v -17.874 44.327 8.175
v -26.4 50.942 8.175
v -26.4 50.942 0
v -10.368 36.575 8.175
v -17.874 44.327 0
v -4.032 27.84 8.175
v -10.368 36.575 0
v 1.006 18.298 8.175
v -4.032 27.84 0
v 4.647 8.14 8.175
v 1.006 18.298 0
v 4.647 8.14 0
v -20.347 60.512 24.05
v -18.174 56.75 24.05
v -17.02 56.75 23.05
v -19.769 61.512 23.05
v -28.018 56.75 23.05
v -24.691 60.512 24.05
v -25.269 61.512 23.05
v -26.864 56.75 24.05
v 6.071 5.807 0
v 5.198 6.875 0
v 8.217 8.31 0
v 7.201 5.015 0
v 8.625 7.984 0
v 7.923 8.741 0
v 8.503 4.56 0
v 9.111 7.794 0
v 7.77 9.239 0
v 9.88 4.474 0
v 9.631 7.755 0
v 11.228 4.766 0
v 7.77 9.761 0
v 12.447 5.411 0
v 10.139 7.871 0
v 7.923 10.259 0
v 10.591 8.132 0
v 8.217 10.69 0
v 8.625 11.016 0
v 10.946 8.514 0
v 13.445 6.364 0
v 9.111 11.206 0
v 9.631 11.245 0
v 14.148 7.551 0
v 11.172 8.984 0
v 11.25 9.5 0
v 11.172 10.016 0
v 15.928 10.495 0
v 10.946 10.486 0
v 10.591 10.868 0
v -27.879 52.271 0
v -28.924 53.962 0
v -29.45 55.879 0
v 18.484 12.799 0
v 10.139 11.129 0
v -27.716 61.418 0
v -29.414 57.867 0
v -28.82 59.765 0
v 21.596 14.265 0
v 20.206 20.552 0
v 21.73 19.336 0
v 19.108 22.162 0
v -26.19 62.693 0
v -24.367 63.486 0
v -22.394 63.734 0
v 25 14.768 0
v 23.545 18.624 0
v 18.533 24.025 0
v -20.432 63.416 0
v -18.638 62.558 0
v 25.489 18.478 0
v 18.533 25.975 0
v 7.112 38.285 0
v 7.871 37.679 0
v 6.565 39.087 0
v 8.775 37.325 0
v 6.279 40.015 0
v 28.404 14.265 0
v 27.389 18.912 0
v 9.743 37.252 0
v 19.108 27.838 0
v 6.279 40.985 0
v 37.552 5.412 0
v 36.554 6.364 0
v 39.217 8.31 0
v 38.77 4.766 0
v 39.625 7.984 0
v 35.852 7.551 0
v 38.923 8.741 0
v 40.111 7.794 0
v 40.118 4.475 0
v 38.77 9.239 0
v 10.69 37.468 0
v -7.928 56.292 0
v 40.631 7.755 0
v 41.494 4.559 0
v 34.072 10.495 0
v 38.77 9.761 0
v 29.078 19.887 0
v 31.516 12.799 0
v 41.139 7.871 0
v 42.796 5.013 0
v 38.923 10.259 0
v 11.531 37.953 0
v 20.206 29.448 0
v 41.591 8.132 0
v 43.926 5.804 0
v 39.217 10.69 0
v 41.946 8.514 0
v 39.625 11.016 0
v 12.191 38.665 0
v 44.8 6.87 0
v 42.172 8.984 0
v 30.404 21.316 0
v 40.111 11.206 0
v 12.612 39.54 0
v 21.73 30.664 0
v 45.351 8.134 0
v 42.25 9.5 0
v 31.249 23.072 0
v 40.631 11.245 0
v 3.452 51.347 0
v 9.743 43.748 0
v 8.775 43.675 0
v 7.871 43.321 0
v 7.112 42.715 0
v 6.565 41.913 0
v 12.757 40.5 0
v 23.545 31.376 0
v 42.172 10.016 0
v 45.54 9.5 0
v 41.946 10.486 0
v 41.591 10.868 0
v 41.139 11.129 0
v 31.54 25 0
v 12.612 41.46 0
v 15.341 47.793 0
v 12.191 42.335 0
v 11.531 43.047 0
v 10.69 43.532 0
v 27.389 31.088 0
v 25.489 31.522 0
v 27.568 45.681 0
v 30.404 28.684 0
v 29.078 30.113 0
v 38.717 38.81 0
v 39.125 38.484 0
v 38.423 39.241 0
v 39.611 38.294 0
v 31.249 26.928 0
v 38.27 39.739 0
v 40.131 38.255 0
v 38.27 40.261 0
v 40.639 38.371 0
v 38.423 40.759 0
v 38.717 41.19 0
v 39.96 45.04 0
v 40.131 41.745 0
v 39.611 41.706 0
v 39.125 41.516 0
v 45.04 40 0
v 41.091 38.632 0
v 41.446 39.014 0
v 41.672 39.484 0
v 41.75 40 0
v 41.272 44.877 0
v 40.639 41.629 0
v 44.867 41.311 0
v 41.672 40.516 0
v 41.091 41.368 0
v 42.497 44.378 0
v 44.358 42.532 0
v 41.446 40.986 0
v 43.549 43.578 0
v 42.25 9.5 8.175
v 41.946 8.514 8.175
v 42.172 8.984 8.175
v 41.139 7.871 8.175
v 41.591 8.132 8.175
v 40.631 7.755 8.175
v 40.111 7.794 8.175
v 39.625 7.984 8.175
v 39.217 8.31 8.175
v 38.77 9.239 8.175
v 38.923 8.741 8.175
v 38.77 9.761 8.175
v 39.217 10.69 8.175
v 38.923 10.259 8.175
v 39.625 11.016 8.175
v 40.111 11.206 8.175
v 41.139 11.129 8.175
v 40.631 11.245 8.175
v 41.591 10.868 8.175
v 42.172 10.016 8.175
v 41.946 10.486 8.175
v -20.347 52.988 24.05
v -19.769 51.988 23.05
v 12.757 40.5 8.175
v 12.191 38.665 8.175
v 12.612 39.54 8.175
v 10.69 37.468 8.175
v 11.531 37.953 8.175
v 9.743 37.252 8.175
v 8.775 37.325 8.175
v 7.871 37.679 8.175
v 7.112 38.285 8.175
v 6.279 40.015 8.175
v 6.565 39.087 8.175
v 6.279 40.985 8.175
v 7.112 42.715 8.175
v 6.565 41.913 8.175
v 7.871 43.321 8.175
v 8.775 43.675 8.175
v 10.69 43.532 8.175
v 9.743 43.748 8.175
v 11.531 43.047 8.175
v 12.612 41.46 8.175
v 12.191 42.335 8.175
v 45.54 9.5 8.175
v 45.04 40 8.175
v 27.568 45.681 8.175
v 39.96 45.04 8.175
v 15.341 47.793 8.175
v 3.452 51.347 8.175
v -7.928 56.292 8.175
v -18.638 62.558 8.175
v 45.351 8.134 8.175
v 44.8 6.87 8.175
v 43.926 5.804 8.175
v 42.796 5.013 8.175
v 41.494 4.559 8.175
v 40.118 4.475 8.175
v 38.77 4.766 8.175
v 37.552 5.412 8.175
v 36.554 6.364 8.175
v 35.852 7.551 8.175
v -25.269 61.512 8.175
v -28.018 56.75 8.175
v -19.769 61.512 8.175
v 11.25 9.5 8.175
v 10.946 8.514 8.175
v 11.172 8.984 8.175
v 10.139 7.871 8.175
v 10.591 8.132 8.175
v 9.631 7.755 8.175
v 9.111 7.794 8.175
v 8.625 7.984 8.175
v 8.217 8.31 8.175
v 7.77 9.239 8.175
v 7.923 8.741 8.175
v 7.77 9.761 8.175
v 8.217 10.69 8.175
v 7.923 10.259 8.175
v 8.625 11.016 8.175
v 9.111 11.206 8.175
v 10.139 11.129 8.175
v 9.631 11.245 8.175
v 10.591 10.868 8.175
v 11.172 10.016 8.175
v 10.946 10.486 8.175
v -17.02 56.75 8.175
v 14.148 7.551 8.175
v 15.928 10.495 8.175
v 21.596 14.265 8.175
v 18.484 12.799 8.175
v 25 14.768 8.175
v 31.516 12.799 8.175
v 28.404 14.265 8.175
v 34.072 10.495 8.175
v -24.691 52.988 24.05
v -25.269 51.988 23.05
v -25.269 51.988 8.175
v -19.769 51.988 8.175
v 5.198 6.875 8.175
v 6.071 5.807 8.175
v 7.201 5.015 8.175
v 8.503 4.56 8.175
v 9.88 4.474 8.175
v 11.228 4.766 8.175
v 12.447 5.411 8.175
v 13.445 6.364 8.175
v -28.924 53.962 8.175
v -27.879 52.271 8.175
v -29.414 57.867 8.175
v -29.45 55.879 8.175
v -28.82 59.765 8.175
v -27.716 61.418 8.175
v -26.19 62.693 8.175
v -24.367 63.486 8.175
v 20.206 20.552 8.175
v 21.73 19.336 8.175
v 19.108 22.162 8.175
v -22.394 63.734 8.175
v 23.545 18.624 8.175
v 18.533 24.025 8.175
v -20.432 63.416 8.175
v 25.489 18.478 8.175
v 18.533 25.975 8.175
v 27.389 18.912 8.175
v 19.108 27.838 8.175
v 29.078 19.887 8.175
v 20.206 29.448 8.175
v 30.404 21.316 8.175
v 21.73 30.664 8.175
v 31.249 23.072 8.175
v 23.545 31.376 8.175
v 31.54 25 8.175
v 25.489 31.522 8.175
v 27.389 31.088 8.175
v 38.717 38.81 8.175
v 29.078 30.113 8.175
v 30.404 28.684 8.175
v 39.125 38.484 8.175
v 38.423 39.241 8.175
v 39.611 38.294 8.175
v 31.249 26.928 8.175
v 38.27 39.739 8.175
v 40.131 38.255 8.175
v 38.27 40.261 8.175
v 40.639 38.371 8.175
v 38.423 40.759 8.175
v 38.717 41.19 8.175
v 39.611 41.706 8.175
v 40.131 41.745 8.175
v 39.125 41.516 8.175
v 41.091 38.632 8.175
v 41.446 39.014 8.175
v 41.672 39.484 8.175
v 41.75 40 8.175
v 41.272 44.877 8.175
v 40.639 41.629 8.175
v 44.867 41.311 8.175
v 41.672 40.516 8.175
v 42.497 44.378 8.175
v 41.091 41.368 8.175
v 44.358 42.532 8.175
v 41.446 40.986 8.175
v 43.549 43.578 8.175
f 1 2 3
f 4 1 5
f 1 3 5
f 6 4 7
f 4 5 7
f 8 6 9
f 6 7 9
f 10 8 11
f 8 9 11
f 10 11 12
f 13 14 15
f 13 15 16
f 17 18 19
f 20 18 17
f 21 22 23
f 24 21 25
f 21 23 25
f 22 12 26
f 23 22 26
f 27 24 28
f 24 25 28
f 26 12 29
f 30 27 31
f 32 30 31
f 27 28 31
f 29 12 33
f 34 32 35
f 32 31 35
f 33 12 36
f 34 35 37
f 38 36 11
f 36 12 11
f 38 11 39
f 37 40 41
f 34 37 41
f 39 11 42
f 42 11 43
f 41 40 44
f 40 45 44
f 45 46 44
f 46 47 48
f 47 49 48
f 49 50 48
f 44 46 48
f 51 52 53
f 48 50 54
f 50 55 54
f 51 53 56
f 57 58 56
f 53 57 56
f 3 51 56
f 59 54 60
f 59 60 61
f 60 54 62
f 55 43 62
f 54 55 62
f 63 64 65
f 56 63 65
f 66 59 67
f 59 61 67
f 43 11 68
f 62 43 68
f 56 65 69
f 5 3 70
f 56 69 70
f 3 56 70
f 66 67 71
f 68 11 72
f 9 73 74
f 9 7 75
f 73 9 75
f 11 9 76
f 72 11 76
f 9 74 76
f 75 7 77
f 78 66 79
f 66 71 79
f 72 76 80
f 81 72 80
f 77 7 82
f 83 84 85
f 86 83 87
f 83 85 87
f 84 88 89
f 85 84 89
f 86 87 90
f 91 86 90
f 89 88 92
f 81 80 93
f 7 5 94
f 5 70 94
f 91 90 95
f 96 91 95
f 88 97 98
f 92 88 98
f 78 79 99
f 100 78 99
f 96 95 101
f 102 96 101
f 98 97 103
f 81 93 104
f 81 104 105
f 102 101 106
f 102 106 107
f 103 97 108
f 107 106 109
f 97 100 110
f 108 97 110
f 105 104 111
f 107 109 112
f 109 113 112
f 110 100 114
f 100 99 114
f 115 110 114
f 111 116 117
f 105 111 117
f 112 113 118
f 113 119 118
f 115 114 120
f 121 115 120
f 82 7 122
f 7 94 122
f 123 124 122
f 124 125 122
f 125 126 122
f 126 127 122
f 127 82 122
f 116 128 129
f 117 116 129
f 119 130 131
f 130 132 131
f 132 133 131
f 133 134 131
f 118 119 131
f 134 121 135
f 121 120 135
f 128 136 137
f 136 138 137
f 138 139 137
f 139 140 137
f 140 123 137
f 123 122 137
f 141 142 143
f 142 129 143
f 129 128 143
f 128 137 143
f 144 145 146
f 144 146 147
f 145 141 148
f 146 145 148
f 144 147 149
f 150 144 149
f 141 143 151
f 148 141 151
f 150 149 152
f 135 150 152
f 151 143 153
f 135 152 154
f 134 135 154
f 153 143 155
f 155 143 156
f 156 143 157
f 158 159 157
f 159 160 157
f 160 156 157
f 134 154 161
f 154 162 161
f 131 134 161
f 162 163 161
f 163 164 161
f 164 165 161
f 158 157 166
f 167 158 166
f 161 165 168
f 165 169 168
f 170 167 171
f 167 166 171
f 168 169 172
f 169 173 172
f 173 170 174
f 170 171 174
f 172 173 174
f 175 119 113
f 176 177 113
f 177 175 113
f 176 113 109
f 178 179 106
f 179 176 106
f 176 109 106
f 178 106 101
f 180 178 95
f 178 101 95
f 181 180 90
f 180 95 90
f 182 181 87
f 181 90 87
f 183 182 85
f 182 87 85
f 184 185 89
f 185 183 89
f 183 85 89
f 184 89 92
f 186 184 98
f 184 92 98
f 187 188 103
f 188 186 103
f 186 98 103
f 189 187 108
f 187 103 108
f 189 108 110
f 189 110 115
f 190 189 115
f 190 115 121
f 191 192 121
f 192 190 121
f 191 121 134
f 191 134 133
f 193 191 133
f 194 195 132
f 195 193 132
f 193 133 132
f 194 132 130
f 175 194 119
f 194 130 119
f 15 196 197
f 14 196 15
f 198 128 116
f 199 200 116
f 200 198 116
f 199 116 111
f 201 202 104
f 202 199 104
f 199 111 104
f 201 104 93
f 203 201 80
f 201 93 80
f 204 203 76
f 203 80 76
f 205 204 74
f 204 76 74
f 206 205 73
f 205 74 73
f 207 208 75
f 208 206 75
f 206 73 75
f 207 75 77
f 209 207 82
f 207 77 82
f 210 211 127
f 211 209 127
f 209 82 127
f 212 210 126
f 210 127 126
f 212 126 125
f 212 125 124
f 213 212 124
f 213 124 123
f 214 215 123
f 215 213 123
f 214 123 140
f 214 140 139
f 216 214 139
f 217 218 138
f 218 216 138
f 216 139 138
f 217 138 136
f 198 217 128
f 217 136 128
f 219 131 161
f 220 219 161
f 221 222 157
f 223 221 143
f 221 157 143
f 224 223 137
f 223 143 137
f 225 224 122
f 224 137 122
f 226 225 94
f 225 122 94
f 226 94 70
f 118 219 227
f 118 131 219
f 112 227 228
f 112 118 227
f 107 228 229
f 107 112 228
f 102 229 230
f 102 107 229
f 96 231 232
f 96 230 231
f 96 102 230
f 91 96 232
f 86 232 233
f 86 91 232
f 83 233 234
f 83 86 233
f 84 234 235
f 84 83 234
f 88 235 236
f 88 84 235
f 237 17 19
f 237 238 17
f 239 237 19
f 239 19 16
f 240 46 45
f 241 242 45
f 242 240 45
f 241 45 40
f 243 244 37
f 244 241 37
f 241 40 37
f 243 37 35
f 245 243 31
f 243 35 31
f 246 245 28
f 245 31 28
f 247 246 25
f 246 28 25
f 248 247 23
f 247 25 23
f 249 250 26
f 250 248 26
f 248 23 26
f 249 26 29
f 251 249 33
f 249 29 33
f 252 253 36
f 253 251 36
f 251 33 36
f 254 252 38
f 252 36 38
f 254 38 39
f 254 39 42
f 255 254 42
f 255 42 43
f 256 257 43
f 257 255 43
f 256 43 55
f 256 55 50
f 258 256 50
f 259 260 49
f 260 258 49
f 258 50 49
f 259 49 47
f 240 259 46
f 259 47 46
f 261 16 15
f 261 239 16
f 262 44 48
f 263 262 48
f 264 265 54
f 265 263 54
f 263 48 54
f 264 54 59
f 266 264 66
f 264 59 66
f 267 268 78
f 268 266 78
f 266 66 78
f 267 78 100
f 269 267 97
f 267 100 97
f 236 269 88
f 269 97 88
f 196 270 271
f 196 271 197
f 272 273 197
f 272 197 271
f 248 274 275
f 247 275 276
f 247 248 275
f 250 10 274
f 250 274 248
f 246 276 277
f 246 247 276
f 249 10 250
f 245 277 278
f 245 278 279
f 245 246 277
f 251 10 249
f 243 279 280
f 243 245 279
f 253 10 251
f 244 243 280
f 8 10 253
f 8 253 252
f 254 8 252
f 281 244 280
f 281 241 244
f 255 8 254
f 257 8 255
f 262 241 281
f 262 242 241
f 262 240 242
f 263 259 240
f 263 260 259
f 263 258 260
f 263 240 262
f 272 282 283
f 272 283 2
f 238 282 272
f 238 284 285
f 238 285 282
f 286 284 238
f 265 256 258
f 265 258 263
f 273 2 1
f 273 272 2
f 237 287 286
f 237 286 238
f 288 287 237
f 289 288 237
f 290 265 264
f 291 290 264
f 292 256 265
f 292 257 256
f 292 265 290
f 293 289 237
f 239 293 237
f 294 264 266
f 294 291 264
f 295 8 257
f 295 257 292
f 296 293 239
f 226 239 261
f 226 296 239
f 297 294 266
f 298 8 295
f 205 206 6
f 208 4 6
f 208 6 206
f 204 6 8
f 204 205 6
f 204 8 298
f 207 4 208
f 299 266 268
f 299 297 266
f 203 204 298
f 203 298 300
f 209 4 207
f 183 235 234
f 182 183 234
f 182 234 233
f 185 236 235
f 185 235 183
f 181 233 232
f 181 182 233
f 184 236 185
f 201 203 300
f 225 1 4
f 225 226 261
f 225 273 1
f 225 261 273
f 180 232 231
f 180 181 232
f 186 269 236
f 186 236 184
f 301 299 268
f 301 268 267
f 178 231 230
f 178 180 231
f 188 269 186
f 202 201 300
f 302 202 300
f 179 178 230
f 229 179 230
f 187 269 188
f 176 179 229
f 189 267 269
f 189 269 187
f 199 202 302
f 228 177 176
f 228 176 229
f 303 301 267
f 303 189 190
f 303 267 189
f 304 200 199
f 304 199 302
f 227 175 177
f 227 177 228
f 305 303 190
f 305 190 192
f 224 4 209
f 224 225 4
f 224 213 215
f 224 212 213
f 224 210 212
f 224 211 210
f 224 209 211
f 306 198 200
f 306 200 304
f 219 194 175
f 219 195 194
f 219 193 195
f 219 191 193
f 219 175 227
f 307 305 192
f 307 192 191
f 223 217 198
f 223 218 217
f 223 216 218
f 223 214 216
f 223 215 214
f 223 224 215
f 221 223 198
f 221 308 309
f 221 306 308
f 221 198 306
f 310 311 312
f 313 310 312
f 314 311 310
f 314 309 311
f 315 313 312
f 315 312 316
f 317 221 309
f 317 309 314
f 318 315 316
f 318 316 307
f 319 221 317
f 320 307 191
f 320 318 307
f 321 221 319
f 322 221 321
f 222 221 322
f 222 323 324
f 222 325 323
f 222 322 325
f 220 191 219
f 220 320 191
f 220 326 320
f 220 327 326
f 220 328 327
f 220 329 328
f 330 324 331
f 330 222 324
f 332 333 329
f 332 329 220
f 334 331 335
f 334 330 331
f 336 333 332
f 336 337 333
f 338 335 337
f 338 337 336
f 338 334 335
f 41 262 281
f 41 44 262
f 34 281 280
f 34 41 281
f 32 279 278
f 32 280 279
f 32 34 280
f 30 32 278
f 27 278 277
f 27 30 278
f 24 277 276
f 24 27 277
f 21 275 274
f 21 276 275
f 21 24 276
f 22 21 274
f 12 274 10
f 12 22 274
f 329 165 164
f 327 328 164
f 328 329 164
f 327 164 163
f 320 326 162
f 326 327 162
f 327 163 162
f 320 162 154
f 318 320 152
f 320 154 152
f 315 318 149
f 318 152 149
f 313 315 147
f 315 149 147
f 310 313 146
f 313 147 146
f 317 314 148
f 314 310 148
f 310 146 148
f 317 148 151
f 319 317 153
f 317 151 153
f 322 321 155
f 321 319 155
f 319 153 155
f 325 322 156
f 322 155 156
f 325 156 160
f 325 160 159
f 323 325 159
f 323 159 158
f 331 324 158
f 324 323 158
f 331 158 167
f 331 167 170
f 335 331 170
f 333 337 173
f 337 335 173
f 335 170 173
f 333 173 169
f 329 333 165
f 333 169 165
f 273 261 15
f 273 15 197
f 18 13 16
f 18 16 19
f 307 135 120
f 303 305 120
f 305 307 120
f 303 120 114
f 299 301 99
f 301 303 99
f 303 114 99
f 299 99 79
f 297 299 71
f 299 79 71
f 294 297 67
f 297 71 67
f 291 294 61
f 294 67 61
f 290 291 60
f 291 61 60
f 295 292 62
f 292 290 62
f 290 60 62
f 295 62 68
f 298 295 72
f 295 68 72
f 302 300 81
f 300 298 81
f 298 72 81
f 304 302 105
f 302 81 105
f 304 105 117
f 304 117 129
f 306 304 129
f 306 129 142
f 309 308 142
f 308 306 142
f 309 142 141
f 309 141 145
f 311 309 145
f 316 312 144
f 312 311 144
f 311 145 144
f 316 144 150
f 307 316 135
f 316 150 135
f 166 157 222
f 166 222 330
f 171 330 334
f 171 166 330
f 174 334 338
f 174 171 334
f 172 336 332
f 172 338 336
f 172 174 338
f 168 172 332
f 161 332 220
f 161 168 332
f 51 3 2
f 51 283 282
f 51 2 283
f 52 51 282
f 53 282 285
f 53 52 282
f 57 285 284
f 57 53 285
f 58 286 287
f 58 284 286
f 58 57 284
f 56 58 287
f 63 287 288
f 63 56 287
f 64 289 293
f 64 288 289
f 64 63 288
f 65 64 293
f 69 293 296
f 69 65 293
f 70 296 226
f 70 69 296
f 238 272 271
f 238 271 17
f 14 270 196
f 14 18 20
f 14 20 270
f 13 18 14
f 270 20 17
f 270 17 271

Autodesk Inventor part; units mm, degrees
ref_plane "YZ Plane" through (0, 0, 0) normal (1, 0, 0) x (0, 1, 0)
ref_plane "XZ Plane" through (0, 0, 0) normal (0, 1, 0) x (-1, 0, 0)
ref_plane "XY Plane" through (0, 0, 0) normal (0, 0, 1) x (1, 0, 0)
sketch "Sketch1" plane through (0, 0, 0) normal (0, 0, 1) x (1, 0, 0)
  circle A0 centre (9.5, 9.5) radius 2.5 projected
  circle A1 centre (40, 40) radius 2.5 projected
  circle A2 centre (40.5, 9.5) radius 2.5 projected
  circle A3 centre (9.5, 40.5) radius 2.5 projected
  line L0 (47.46, 3) -> (27.54, 3) projected
  line L1 (47.46, 3) -> (47.46, 12.7) projected
  line L2 (47.46, 12.7) -> (50, 12.7) projected
  line L3 (50, 12.7) -> (50, 40) projected
  arc A4 (50, 40) -> (40, 50) centre (40, 40) ccw projected
  line L4 (10, 50) -> (40, 50) projected
  arc A5 (10, 50) -> (0, 40) centre (10, 40) ccw projected
  line L5 (0, 12.7) -> (0, 40) projected
  line L6 (0, 12.7) -> (2.54, 12.7) projected
  line L7 (2.54, 12.7) -> (2.54, 3) projected
  line L8 (22.46, 3) -> (2.54, 3) projected
  line L9 (22.46, 3) -> (22.46, 12.7) projected
  line L10 (22.46, 12.7) -> (27.54, 12.7) projected
  line L11 (27.54, 12.7) -> (27.54, 3) projected
  circle A6 centre (25, 25) radius 4 projected
  line L12 (25, 25) -> (-22.519, 56.75) construction
  line L13 (-22.519, 56.75) -> (25, 56.75) construction
  line L14 (25, 56.75) -> (25, 25) construction
  line L15 (-28.0183, 56.75) -> (-25.2687, 61.5125)
  line L16 (-25.2687, 61.5125) -> (-19.7694, 61.5125)
  line L17 (-19.7694, 61.5125) -> (-17.0198, 56.75)
  line L18 (-17.0198, 56.75) -> (-19.7694, 51.9875)
  line L19 (-19.7694, 51.9875) -> (-25.2687, 51.9875)
  line L20 (-25.2687, 51.9875) -> (-28.0183, 56.75)
  line L21 (-19.7694, 61.5125) -> (-25.2687, 51.9875) construction
  circle A7 centre (-22.519, 56.75) radius 6.985
  circle A8 centre (40, 40) radius 5.04
  circle A9 centre (40.5, 9.5) radius 5.04
  circle A10 centre (9.5, 9.5) radius 5.04
  arc A11 (35.8521, 7.5509) -> (14.1479, 7.5509) centre (25, 3) ccw
  arc A12 (4.6471, 8.1396) -> (-26.3996, 50.9421) centre (-68.7442, -12.4335) ccw
  arc A13 (-18.6385, 62.5579) -> (39.9595, 45.0398) centre (39.1237, 149.0084) ccw
  circle A14 centre (25, 25) radius 6.54
  line L22 (-26.3996, 50.9421) -> (-15.682, 43.7811) construction
  line L23 (-18.6385, 62.5579) -> (-6.4516, 54.4152) construction
  line L24 (45.54, 9.5) -> (45.04, 40)
  circle A15 centre (40, 40) radius 1.75 projected
  circle A16 centre (40.5, 9.5) radius 1.75 projected
  circle A17 centre (9.5, 9.5) radius 1.75 projected
  circle A18 centre (9.5, 40.5) radius 3.2571
  point P0 (0, 0)
  dimension "d0" = 57.15
  dimension "d1" = 31.75
  dimension "d3" = 120
  dimension "d4" = 120
  dimension "d5" = 9.525
  dimension "d6" = 13.97
  dimension "d7" = 2.54
  dimension "d8" = 2.54
  dimension "d9" = 2.54
  dimension "d11" = 2.54
extrude "Extrusion1" add sketch "Sketch1" along normal blind 8.175 contours A0 | A1 | A2 | A9 | A13 A8 L24 A9 A11 A10 A12 L5 A5 | A5 L5 A12 A7 A13 | A7 | A8 | A10 | L15 L16 L17 L18 L19 L20
sketch "Sketch2" plane through (0, 0, 8.175) normal (0, 0, 1) x (1, 0, 0)
  line L0 (-25.2687, 51.9875) -> (-28.0183, 56.75) projected
  line L1 (-28.0183, 56.75) -> (-25.2687, 61.5125) projected
  line L2 (-25.2687, 61.5125) -> (-19.7694, 61.5125) projected
  line L3 (-19.7694, 61.5125) -> (-17.0198, 56.75) projected
  line L4 (-17.0198, 56.75) -> (-19.7694, 51.9875) projected
  line L5 (-19.7694, 51.9875) -> (-25.2687, 51.9875) projected
  point P0 (0, 0)
extrude "Extrusion2" add sketch "Sketch2" along normal blind 15.875
chamfer "Chamfer1" distance 1 angle 45 6 edges at (-22.519, 61.5125, 24.05) (-26.6435, 59.1312, 24.05) (-26.6435, 54.3687, 24.05) (-22.519, 51.9875, 24.05) (-18.3946, 59.1312, 24.05) (-18.3946, 54.3687, 24.05)
properties part number "ArmGearMount"
